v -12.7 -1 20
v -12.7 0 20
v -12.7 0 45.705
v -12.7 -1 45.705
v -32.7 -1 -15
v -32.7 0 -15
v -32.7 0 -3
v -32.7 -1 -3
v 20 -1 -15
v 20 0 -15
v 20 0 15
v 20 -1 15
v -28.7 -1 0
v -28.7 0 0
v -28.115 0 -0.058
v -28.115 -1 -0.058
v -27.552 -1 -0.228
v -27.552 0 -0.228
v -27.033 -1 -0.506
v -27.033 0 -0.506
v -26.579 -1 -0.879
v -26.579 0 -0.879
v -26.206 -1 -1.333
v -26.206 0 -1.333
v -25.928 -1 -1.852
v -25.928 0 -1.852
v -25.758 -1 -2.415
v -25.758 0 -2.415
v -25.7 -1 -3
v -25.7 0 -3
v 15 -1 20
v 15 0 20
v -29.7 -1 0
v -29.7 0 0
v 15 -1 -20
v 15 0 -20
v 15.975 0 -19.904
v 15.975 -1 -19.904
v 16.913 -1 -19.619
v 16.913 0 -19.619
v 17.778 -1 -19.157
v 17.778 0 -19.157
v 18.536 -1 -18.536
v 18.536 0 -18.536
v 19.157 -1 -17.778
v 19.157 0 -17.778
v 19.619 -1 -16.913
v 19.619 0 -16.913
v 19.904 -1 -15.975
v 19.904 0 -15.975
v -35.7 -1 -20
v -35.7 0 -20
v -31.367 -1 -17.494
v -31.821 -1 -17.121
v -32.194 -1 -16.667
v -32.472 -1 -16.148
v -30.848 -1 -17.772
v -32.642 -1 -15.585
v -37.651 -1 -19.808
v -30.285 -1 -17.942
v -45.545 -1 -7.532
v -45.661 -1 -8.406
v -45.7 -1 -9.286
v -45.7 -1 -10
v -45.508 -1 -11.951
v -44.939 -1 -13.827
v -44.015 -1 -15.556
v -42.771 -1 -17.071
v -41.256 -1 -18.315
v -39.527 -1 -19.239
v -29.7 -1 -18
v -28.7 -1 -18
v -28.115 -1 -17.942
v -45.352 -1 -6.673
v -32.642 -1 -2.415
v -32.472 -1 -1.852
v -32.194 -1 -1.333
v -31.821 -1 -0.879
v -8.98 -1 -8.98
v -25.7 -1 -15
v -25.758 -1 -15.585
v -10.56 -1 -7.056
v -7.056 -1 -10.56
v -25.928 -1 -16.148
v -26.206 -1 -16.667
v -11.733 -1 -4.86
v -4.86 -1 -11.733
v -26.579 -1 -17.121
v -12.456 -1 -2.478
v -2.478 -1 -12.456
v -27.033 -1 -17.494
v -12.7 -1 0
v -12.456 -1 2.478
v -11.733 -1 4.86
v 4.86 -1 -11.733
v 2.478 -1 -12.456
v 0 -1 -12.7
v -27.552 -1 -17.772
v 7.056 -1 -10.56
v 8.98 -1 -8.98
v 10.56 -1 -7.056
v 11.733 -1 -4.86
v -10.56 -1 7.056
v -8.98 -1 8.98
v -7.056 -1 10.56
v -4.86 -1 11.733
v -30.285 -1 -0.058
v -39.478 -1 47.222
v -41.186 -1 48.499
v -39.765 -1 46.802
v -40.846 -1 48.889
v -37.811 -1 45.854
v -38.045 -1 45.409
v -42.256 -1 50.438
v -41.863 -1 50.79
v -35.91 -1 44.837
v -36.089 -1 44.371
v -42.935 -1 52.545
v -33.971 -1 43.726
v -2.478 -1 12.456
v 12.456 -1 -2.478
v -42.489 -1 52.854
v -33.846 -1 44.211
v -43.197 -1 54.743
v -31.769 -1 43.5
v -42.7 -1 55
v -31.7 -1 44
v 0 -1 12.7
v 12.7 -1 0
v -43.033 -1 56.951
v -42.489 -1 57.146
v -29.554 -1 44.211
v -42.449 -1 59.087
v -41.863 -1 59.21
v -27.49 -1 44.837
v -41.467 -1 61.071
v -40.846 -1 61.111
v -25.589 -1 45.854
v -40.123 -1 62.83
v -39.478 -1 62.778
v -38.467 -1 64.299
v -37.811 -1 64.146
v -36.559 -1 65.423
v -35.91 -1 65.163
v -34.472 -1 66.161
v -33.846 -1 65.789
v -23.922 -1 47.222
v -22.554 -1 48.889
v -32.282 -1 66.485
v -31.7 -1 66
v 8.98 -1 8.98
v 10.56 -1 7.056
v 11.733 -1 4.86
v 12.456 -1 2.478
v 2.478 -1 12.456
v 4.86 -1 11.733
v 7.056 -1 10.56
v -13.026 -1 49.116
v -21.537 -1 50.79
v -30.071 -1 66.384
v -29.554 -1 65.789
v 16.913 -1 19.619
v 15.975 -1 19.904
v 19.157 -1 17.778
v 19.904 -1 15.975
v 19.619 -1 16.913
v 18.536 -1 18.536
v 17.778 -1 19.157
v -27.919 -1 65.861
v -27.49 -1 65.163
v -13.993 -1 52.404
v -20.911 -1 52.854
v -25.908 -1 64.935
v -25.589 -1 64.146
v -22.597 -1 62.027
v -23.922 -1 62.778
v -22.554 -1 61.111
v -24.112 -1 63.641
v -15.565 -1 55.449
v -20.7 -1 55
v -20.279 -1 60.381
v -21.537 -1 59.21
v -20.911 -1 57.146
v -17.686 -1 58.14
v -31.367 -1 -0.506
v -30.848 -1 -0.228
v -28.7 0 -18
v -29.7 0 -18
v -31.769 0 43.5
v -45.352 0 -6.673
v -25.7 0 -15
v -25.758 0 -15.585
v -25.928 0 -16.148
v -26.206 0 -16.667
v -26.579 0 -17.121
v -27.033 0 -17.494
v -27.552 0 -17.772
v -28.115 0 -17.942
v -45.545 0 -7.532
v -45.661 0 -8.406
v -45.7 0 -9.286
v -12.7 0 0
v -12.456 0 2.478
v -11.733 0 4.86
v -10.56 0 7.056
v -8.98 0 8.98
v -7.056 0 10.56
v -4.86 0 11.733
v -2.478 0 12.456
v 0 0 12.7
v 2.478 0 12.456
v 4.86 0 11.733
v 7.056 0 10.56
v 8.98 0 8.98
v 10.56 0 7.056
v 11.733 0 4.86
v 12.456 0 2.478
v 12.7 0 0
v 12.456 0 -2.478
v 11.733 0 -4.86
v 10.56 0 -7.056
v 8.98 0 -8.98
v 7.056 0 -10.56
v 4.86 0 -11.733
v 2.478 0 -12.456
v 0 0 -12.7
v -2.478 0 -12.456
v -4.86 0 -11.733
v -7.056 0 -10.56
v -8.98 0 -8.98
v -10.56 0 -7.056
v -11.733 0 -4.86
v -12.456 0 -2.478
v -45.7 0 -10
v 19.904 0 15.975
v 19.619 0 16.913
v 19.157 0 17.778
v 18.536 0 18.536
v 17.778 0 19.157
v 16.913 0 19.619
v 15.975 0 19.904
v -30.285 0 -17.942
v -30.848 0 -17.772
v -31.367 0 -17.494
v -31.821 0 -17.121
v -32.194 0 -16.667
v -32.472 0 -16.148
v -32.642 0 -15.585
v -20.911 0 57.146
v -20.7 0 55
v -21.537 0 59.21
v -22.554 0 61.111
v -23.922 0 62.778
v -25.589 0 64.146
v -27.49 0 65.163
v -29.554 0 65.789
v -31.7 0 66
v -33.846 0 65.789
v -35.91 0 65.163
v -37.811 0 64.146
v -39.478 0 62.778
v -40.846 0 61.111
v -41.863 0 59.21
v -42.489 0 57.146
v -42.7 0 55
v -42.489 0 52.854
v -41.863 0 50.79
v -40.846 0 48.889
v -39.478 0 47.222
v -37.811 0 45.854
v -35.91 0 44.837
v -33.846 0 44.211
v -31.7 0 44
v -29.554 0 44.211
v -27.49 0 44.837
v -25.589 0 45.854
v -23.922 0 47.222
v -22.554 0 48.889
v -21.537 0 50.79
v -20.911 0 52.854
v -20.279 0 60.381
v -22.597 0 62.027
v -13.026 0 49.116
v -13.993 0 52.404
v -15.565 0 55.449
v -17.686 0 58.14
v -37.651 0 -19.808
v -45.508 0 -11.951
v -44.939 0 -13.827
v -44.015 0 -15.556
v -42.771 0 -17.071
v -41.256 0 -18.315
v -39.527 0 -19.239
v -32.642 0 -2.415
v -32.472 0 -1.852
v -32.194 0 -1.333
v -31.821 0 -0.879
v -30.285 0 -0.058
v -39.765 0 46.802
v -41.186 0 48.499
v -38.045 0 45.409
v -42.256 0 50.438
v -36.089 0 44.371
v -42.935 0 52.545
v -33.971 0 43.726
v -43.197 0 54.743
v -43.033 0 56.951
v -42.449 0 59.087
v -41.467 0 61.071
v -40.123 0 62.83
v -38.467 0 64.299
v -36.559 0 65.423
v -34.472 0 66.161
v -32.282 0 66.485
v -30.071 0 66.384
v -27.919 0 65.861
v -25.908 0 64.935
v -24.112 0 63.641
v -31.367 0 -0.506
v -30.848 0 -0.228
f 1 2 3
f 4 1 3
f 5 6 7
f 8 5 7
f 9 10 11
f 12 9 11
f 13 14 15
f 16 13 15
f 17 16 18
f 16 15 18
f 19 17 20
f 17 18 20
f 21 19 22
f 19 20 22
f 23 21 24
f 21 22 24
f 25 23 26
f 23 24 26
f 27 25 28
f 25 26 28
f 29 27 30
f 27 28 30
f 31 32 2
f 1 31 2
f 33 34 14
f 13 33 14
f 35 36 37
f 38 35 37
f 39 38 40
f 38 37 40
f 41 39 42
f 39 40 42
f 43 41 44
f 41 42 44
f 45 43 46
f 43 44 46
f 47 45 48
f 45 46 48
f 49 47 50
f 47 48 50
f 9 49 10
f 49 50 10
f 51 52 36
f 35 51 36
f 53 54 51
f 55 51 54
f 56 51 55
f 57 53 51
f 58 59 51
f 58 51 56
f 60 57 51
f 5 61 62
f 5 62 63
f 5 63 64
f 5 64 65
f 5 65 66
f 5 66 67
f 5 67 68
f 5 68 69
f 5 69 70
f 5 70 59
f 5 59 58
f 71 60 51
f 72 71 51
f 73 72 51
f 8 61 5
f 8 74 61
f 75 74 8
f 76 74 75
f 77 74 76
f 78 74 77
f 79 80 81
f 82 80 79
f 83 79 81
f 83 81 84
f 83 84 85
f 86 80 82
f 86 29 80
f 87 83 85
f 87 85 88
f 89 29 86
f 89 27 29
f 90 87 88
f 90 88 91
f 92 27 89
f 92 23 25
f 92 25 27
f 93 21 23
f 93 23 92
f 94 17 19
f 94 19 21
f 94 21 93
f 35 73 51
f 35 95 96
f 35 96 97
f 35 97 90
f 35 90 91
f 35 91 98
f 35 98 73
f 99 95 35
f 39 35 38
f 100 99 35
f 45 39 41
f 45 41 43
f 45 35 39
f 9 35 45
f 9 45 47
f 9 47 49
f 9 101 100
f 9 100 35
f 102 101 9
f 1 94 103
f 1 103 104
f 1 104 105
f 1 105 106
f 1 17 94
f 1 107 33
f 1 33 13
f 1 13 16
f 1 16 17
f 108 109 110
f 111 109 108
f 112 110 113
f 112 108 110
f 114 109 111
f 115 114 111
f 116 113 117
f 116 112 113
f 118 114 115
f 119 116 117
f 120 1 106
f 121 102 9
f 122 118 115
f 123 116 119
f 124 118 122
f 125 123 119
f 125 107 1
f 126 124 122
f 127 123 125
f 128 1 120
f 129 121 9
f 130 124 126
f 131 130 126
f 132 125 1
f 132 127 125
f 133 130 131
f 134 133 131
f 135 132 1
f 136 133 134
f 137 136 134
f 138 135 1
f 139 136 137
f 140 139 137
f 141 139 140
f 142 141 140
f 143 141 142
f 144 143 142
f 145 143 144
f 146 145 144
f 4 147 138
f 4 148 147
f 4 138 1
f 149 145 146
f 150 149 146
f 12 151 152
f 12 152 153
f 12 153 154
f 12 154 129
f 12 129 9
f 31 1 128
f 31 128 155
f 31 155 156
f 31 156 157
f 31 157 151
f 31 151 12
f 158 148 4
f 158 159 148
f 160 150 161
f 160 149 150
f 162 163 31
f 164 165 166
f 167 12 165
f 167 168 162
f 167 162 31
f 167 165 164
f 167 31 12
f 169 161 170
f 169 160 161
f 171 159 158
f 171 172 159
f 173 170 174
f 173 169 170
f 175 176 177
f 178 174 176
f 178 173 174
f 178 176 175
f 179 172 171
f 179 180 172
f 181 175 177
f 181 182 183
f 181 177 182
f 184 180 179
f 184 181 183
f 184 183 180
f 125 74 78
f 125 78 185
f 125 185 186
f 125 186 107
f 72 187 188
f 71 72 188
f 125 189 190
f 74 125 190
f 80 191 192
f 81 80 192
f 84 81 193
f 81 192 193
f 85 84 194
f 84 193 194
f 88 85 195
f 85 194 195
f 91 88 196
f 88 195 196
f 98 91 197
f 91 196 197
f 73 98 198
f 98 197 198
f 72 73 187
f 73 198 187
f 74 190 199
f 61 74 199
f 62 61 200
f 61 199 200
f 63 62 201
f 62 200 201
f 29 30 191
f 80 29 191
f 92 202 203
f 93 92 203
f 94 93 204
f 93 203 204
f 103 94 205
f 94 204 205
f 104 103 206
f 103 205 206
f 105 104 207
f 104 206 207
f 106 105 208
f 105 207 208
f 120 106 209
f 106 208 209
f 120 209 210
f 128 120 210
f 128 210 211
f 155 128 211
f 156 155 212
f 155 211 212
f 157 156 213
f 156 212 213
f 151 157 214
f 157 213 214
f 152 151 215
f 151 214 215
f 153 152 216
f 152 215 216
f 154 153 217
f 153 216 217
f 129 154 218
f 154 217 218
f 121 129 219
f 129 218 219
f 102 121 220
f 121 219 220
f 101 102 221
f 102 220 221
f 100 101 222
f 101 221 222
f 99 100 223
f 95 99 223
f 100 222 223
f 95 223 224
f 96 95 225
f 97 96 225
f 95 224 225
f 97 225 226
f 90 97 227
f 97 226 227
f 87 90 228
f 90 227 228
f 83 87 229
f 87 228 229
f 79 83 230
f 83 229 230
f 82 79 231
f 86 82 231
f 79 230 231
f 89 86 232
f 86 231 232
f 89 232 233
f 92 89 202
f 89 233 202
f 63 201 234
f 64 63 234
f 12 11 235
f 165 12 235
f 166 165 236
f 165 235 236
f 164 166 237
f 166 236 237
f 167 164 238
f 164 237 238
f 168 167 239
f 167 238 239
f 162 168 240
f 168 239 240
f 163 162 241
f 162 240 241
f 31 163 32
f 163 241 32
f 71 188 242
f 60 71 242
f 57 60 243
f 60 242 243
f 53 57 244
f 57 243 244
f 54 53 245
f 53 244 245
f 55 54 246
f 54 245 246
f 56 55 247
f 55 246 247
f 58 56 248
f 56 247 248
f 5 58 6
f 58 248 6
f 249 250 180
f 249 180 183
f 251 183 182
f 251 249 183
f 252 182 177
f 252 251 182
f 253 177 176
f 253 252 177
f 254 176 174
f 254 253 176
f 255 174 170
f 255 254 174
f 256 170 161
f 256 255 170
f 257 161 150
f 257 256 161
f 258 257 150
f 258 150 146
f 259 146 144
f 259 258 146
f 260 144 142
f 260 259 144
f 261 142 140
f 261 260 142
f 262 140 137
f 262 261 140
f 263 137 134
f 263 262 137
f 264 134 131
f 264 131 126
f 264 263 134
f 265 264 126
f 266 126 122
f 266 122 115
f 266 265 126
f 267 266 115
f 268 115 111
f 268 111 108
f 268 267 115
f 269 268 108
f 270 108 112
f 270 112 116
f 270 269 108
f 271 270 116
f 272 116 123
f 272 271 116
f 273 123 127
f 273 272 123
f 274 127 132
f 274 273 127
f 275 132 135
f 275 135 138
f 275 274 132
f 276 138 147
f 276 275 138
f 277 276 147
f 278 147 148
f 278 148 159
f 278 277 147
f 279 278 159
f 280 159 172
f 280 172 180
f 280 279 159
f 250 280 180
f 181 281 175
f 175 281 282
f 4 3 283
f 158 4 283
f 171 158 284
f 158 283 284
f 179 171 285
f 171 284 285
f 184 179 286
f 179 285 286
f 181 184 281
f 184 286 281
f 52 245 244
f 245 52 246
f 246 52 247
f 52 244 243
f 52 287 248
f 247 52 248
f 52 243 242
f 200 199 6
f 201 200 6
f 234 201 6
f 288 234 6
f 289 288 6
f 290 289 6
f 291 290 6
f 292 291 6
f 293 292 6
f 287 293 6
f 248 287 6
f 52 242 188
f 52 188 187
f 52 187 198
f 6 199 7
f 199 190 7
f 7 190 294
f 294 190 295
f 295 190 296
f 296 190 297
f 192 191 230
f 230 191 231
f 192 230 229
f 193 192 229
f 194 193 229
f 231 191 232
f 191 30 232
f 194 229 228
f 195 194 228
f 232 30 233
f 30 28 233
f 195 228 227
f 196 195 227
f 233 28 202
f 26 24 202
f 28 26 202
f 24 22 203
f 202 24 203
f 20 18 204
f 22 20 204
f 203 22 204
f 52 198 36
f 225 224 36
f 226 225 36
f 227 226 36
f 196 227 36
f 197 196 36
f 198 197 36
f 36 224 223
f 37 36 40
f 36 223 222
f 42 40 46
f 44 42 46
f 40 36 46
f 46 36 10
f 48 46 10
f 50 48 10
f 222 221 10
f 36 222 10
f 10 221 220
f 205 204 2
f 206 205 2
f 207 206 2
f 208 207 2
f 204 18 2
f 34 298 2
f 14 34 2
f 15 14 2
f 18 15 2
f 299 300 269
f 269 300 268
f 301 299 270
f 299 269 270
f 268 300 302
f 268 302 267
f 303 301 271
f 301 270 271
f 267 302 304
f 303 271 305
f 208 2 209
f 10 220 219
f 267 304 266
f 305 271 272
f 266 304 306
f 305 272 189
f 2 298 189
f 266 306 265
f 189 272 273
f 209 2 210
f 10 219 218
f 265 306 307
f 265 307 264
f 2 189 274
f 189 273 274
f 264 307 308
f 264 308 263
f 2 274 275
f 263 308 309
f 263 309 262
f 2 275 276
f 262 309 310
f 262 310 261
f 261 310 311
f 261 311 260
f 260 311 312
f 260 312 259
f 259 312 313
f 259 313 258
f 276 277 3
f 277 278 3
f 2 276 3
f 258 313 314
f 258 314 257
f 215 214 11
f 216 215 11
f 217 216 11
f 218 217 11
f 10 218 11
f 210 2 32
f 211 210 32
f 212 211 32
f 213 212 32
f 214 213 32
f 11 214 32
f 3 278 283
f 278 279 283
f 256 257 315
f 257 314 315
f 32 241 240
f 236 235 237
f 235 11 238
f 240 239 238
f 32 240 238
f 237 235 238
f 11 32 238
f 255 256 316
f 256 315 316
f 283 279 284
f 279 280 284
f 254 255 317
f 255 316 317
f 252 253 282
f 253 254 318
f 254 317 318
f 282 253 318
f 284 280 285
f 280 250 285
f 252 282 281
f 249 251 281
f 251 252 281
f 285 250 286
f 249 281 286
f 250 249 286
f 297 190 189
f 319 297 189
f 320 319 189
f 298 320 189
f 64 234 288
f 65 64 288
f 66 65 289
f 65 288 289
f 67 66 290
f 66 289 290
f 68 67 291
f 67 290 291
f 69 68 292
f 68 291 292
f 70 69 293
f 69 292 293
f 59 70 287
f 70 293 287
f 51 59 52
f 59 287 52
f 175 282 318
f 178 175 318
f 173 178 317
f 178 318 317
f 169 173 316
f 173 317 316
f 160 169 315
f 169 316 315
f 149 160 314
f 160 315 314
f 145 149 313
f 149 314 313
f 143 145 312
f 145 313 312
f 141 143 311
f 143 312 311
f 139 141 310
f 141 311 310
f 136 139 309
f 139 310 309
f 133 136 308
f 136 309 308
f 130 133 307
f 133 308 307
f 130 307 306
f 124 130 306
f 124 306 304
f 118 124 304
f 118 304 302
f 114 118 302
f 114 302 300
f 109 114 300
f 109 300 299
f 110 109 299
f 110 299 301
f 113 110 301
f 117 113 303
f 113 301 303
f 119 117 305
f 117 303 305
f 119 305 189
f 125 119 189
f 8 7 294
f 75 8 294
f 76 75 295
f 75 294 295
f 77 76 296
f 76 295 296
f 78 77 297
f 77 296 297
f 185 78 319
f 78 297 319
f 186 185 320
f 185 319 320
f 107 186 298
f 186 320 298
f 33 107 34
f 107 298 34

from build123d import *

# Parameters (mm, degrees)
F0_R     = 11
F1_DEPTH = 1


with BuildPart() as f1:
    # F0 (on Front) → F1 (new body)
    with BuildSketch(Plane.XZ):
        with BuildLine():
            ThreePointArc((-20.2, 55), (-20.815670936, 58.7123282218), (-22.5967618828, 62.0271655581))
            ThreePointArc((-22.5967618828, 62.0271655581), (-42.0061632577, 60.1022542964), (-31.7688713732, 43.5002062308))
            ThreePointArc((-31.7688713732, 43.5002062308), (-23.5926582899, 46.8439586565), (-20.2, 55))
        make_face()
        with Locations((-31.7, 55)):
            Circle(F0_R, mode=Mode.SUBTRACT)
        with BuildLine():
            Line((-20, 20), (-12.7, 20))
            Line((-12.7, 20), (-12.7, 45.7048399691))
            ThreePointArc((-12.7, 45.7048399691), (-14.7065803005, 53.9638063884), (-20.2789473684, 60.3814084389))
            Line((-20.2789473684, 60.3814084389), (-22.5967618828, 62.0271655581))
            ThreePointArc((-22.5967618828, 62.0271655581), (-20.815670936, 58.7123282218), (-20.2, 55))
            ThreePointArc((-20.2, 55), (-23.5926582899, 46.8439586565), (-31.7688713732, 43.5002062308))
            Line((-31.7688713732, 43.5002062308), (-45.3524999934, -6.6727046639))
            ThreePointArc((-45.3524999934, -6.6727046639), (-45.6127443207, -7.9678442227), (-45.7, -9.2859868679))
            Line((-45.7, -9.2859868679), (-45.7, -10))
            ThreePointArc((-45.7, -10), (-42.7710678119, -17.0710678119), (-35.7, -20))
            Line((-35.7, -20), (-20, -20))
            Line((-20, -20), (-20, 20))
        make_face()
        with BuildLine():
            ThreePointArc((-32.7, -3), (-31.8213203436, -0.8786796564), (-29.7, 0))
            Line((-29.7, 0), (-28.7, 0))
            ThreePointArc((-28.7, 0), (-26.5786796564, -0.8786796564), (-25.7, -3))
            Line((-25.7, -3), (-25.7, -15))
            ThreePointArc((-25.7, -15), (-26.5786796564, -17.1213203436), (-28.7, -18))
            Line((-28.7, -18), (-29.7, -18))
            ThreePointArc((-29.7, -18), (-31.8213203436, -17.1213203436), (-32.7, -15))
            Line((-32.7, -15), (-32.7, -3))
        make_face(mode=Mode.SUBTRACT)
        with BuildLine():
            Line((-12.7, 20), (-12.7, -1.15e-08))
            Line((-12.7, -1.15e-08), (-12.7, -20))
            Line((-12.7, -20), (15, -20))
            ThreePointArc((15, -20), (18.5355339059, -18.5355339059), (20, -15))
            Line((20, -15), (20, 15))
            ThreePointArc((20, 15), (18.5355339059, 18.5355339059), (15, 20))
            Line((15, 20), (-12.7, 20))
        make_face()
        with BuildLine():
            ThreePointArc((-12.7, -1.15e-08), (-5.7e-09, 12.7), (12.7, 0))
            ThreePointArc((12.7, 0), (5.7e-09, -12.7), (-12.7, -1.15e-08))
        make_face(mode=Mode.SUBTRACT)
        Polygon((-12.7, -20), (-12.7, -1.15e-08), (-12.7, 20), (-20, 20), (-20, -20), align=None)
    extrude(amount=F1_DEPTH)


solid = f1.part
